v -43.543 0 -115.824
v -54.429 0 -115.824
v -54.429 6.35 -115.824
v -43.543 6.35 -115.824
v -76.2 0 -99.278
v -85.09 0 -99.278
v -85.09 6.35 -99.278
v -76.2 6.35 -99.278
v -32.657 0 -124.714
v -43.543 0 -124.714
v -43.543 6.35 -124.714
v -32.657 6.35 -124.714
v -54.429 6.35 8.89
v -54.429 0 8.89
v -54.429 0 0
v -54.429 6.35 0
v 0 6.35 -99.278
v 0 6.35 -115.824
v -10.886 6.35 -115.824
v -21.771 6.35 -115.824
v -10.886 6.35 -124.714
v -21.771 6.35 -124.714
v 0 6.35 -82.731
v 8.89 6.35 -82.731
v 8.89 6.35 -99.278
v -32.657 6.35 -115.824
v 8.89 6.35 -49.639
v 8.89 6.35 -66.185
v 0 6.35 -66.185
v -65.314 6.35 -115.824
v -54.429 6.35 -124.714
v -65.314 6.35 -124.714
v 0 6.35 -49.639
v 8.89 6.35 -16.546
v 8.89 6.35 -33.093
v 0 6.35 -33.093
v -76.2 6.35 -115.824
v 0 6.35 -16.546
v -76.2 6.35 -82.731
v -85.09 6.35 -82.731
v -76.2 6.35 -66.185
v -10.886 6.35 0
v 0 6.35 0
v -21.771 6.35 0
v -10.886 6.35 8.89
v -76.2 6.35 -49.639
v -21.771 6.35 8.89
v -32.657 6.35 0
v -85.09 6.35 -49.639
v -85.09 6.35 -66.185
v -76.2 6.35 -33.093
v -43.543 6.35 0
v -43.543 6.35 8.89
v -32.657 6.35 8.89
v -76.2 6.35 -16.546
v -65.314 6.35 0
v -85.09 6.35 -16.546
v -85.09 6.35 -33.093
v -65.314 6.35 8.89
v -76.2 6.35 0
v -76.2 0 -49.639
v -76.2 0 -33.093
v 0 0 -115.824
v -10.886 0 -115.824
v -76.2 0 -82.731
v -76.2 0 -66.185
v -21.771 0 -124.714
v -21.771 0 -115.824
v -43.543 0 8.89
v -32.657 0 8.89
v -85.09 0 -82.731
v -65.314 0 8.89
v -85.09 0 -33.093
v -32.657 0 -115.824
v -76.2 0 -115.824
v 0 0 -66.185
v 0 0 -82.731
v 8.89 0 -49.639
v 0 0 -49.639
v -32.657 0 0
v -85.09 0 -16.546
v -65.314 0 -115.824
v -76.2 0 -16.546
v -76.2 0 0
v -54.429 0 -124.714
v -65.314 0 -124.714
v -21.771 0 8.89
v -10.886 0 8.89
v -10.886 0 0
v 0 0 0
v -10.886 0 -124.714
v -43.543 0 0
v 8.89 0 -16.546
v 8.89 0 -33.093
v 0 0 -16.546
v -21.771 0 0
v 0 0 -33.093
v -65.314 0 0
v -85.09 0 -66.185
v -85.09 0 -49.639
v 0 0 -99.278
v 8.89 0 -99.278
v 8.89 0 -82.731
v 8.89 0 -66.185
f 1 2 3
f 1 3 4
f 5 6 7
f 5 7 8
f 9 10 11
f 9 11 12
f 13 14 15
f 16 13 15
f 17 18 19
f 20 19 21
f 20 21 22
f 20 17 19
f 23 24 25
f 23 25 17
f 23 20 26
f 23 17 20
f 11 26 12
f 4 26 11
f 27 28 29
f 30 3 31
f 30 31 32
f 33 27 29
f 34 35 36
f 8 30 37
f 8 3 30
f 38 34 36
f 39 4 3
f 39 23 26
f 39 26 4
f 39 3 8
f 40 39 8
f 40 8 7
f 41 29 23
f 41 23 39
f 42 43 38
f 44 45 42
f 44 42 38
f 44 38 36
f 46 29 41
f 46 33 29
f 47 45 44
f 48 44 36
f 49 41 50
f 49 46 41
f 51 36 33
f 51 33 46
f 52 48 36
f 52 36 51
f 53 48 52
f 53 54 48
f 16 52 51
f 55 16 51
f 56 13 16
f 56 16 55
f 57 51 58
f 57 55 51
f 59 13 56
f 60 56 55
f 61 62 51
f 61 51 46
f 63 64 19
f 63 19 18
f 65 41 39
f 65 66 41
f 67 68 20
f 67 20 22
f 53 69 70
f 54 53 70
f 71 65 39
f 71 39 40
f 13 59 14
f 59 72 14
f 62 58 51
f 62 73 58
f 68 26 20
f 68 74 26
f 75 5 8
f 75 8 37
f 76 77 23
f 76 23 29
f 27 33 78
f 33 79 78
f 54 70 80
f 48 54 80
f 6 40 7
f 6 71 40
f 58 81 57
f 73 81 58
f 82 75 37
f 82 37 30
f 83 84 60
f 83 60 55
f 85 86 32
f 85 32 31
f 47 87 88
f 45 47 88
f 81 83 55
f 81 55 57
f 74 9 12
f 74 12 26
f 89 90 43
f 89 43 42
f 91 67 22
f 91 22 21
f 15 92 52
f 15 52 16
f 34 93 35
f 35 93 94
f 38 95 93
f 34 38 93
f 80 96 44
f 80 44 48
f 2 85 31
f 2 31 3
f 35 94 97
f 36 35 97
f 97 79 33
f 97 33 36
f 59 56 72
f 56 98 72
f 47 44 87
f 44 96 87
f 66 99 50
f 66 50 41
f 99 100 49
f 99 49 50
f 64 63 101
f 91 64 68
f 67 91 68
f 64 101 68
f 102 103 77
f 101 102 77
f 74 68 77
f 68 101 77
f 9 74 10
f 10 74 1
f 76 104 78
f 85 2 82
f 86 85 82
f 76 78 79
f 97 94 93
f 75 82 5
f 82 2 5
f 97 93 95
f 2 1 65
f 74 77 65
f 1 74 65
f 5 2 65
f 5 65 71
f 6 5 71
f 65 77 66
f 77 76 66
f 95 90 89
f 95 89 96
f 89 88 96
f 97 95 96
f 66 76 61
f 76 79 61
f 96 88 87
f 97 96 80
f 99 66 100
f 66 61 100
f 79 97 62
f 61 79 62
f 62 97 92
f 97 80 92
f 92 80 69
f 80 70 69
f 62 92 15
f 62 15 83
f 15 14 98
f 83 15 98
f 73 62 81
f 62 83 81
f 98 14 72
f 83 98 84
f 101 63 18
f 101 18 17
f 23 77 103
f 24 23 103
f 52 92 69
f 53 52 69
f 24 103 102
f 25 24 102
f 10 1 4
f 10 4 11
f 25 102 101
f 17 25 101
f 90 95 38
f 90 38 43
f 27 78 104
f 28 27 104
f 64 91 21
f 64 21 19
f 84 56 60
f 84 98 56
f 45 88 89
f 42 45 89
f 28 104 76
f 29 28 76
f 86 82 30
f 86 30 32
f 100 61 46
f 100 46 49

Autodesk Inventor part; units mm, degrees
ref_plane "YZ Plane" through (0, 0, 0) normal (1, 0, 0) x (0, 1, 0)
ref_plane "XZ Plane" through (0, 0, 0) normal (0, 1, 0) x (-1, 0, 0)
ref_plane "XY Plane" through (0, 0, 0) normal (0, 0, 1) x (1, 0, 0)
sketch "Sketch1" plane through (0, 0, 0) normal (0, 1, 0) x (-1, 0, 0)
  point P0 (0, 0)
sketch "Sketch2" plane through (0, 0, 0) normal (0, 1, 0) x (-1, 0, 0)
  line L0 (0, 0) -> (76.2, 0)
  line L1 (76.2, 0) -> (76.2, -115.824)
  line L2 (76.2, -115.824) -> (0, -115.824)
  line L3 (0, -115.824) -> (0, 0)
  dimension "BaseLength" = 76.2
  dimension "BaseWidth" = 115.824
extrude "Base Extrusion" add sketch "Sketch2" along normal blind 6.35
sketch "Sketch3" plane through (0, 0, 0) normal (0, 1, 0) x (-1, 0, 0)
  line L0 (76.2, 0) -> (0, 0) projected
  line L1 (0, 0) -> (0, -115.824) projected
  line L2 (0, -115.824) -> (76.2, -115.824) projected
  line L3 (76.2, -115.824) -> (76.2, 0) projected
  line L4 (10.8857, 0) -> (21.7714, 0)
  line L5 (21.7714, 0) -> (21.7714, 8.89)
  line L6 (21.7714, 8.89) -> (10.8857, 8.89)
  line L7 (10.8857, 8.89) -> (10.8857, 0)
  line L8 (32.6571, 0) -> (43.5429, 0)
  line L9 (43.5429, 0) -> (43.5429, 8.89)
  line L10 (43.5429, 8.89) -> (32.6571, 8.89)
  line L11 (32.6571, 8.89) -> (32.6571, 0)
  line L12 (54.4286, 0) -> (65.3143, 0)
  line L13 (65.3143, 0) -> (65.3143, 8.89)
  line L14 (65.3143, 8.89) -> (54.4286, 8.89)
  line L15 (54.4286, 8.89) -> (54.4286, 0)
  line L16 (76.2, -57.912) -> (0, -57.912) construction
  line L17 (76.2, -115.824) -> (0, -115.824)
  line L18 (10.8857, -115.824) -> (21.7714, -115.824)
  line L19 (21.7714, -115.824) -> (21.7714, -124.714)
  line L20 (21.7714, -124.714) -> (10.8857, -124.714)
  line L21 (10.8857, -124.714) -> (10.8857, -115.824)
  line L22 (43.5429, -115.824) -> (43.5429, -124.714)
  line L23 (43.5429, -124.714) -> (32.6571, -124.714)
  line L24 (32.6571, -124.714) -> (32.6571, -115.824)
  line L25 (32.6571, -115.824) -> (43.5429, -115.824)
  line L26 (65.3143, -115.824) -> (65.3143, -124.714)
  line L27 (65.3143, -124.714) -> (54.4286, -124.714)
  line L28 (54.4286, -124.714) -> (54.4286, -115.824)
  line L29 (54.4286, -115.824) -> (65.3143, -115.824)
  line L30 (38.1, 0) -> (38.1, -115.824) construction
  line L31 (0, -16.5463) -> (-8.89, -16.5463)
  line L32 (-8.89, -16.5463) -> (-8.89, -33.0926)
  line L33 (-8.89, -33.0926) -> (0, -33.0926)
  line L34 (0, -33.0926) -> (0, -16.5463)
  line L35 (0, -49.6389) -> (-8.89, -49.6389)
  line L36 (-8.89, -49.6389) -> (-8.89, -66.1851)
  line L37 (-8.89, -66.1851) -> (0, -66.1851)
  line L38 (0, -66.1851) -> (0, -49.6389)
  line L39 (0, -82.7314) -> (-8.89, -82.7314)
  line L40 (-8.89, -82.7314) -> (-8.89, -99.2777)
  line L41 (-8.89, -99.2777) -> (0, -99.2777)
  line L42 (0, -99.2777) -> (0, -82.7314)
  line L43 (76.2, 0) -> (76.2, -115.824)
  line L44 (76.2, -16.5463) -> (85.09, -16.5463)
  line L45 (85.09, -16.5463) -> (85.09, -33.0926)
  line L46 (85.09, -33.0926) -> (76.2, -33.0926)
  line L47 (76.2, -33.0926) -> (76.2, -16.5463)
  line L48 (76.2, -49.6389) -> (85.09, -49.6389)
  line L49 (85.09, -49.6389) -> (85.09, -66.1851)
  line L50 (85.09, -66.1851) -> (76.2, -66.1851)
  line L51 (76.2, -66.1851) -> (76.2, -49.6389)
  line L52 (76.2, -82.7314) -> (85.09, -82.7314)
  line L53 (85.09, -82.7314) -> (85.09, -99.2777)
  line L54 (85.09, -99.2777) -> (76.2, -99.2777)
  line L55 (76.2, -99.2777) -> (76.2, -82.7314)
  dimension "d4" = 10.8857
  dimension "d5" = 8.89
  dimension "PerpSpace" = 10.8857
  dimension "d7" = 10.8857
  dimension "d8" = 8.89
  dimension "PerpB" = 10.8857
  dimension "PerpA" = 8.89
  dimension "d11" = 10.8857
  dimension "d13" = 10.8857
  dimension "d14" = 76.2
  dimension "WallConSpace" = 16.5463
  dimension "d16" = 115.824
  dimension "WallConA" = 8.89
  dimension "WallConB" = 16.5463
  dimension "d19" = 8.89
  dimension "d20" = 16.5463
  dimension "d21" = 8.89
  dimension "d22" = 16.5463
  dimension "d23" = 16.5463
  dimension "d24" = 16.5463
extrude "Connections" add sketch "Sketch3" along normal blind 6.35 contours L0 L15 L14 L13 | L44 L45 L46 L3 | L0 L11 L10 L9 | L48 L49 L50 L3 | L0 L7 L6 L5 | L52 L53 L54 L3 | L1 L33 L32 L31 | L26 L27 L28 L2 | L1 L37 L36 L35 | L22 L23 L24 L2 | L1 L41 L40 L39 | L19 L20 L21 L2
equation "\"d4\" = 0.142857 * d14"
equation "\"PerpSpace\" = -0.75 * d4 + 0.25 * d14"
equation "\"d7\" = d4"
equation "\"d8\" = d5"
equation "\"PerpB\" = d4"
equation "\"PerpA\" = d5"
equation "\"d11\" = PerpSpace"
equation "\"d13\" = PerpSpace"
equation "\"WallConSpace\" = -0.75 * WallConB + 0.25 * d16"
equation "\"WallConB\" = 0.142857 * d16"
equation "\"d19\" = WallConA"
equation "\"d20\" = WallConB"
equation "\"d21\" = WallConA"
equation "\"d22\" = WallConB"
equation "\"d23\" = WallConSpace"
equation "\"d24\" = WallConSpace"
properties part number "Level"
